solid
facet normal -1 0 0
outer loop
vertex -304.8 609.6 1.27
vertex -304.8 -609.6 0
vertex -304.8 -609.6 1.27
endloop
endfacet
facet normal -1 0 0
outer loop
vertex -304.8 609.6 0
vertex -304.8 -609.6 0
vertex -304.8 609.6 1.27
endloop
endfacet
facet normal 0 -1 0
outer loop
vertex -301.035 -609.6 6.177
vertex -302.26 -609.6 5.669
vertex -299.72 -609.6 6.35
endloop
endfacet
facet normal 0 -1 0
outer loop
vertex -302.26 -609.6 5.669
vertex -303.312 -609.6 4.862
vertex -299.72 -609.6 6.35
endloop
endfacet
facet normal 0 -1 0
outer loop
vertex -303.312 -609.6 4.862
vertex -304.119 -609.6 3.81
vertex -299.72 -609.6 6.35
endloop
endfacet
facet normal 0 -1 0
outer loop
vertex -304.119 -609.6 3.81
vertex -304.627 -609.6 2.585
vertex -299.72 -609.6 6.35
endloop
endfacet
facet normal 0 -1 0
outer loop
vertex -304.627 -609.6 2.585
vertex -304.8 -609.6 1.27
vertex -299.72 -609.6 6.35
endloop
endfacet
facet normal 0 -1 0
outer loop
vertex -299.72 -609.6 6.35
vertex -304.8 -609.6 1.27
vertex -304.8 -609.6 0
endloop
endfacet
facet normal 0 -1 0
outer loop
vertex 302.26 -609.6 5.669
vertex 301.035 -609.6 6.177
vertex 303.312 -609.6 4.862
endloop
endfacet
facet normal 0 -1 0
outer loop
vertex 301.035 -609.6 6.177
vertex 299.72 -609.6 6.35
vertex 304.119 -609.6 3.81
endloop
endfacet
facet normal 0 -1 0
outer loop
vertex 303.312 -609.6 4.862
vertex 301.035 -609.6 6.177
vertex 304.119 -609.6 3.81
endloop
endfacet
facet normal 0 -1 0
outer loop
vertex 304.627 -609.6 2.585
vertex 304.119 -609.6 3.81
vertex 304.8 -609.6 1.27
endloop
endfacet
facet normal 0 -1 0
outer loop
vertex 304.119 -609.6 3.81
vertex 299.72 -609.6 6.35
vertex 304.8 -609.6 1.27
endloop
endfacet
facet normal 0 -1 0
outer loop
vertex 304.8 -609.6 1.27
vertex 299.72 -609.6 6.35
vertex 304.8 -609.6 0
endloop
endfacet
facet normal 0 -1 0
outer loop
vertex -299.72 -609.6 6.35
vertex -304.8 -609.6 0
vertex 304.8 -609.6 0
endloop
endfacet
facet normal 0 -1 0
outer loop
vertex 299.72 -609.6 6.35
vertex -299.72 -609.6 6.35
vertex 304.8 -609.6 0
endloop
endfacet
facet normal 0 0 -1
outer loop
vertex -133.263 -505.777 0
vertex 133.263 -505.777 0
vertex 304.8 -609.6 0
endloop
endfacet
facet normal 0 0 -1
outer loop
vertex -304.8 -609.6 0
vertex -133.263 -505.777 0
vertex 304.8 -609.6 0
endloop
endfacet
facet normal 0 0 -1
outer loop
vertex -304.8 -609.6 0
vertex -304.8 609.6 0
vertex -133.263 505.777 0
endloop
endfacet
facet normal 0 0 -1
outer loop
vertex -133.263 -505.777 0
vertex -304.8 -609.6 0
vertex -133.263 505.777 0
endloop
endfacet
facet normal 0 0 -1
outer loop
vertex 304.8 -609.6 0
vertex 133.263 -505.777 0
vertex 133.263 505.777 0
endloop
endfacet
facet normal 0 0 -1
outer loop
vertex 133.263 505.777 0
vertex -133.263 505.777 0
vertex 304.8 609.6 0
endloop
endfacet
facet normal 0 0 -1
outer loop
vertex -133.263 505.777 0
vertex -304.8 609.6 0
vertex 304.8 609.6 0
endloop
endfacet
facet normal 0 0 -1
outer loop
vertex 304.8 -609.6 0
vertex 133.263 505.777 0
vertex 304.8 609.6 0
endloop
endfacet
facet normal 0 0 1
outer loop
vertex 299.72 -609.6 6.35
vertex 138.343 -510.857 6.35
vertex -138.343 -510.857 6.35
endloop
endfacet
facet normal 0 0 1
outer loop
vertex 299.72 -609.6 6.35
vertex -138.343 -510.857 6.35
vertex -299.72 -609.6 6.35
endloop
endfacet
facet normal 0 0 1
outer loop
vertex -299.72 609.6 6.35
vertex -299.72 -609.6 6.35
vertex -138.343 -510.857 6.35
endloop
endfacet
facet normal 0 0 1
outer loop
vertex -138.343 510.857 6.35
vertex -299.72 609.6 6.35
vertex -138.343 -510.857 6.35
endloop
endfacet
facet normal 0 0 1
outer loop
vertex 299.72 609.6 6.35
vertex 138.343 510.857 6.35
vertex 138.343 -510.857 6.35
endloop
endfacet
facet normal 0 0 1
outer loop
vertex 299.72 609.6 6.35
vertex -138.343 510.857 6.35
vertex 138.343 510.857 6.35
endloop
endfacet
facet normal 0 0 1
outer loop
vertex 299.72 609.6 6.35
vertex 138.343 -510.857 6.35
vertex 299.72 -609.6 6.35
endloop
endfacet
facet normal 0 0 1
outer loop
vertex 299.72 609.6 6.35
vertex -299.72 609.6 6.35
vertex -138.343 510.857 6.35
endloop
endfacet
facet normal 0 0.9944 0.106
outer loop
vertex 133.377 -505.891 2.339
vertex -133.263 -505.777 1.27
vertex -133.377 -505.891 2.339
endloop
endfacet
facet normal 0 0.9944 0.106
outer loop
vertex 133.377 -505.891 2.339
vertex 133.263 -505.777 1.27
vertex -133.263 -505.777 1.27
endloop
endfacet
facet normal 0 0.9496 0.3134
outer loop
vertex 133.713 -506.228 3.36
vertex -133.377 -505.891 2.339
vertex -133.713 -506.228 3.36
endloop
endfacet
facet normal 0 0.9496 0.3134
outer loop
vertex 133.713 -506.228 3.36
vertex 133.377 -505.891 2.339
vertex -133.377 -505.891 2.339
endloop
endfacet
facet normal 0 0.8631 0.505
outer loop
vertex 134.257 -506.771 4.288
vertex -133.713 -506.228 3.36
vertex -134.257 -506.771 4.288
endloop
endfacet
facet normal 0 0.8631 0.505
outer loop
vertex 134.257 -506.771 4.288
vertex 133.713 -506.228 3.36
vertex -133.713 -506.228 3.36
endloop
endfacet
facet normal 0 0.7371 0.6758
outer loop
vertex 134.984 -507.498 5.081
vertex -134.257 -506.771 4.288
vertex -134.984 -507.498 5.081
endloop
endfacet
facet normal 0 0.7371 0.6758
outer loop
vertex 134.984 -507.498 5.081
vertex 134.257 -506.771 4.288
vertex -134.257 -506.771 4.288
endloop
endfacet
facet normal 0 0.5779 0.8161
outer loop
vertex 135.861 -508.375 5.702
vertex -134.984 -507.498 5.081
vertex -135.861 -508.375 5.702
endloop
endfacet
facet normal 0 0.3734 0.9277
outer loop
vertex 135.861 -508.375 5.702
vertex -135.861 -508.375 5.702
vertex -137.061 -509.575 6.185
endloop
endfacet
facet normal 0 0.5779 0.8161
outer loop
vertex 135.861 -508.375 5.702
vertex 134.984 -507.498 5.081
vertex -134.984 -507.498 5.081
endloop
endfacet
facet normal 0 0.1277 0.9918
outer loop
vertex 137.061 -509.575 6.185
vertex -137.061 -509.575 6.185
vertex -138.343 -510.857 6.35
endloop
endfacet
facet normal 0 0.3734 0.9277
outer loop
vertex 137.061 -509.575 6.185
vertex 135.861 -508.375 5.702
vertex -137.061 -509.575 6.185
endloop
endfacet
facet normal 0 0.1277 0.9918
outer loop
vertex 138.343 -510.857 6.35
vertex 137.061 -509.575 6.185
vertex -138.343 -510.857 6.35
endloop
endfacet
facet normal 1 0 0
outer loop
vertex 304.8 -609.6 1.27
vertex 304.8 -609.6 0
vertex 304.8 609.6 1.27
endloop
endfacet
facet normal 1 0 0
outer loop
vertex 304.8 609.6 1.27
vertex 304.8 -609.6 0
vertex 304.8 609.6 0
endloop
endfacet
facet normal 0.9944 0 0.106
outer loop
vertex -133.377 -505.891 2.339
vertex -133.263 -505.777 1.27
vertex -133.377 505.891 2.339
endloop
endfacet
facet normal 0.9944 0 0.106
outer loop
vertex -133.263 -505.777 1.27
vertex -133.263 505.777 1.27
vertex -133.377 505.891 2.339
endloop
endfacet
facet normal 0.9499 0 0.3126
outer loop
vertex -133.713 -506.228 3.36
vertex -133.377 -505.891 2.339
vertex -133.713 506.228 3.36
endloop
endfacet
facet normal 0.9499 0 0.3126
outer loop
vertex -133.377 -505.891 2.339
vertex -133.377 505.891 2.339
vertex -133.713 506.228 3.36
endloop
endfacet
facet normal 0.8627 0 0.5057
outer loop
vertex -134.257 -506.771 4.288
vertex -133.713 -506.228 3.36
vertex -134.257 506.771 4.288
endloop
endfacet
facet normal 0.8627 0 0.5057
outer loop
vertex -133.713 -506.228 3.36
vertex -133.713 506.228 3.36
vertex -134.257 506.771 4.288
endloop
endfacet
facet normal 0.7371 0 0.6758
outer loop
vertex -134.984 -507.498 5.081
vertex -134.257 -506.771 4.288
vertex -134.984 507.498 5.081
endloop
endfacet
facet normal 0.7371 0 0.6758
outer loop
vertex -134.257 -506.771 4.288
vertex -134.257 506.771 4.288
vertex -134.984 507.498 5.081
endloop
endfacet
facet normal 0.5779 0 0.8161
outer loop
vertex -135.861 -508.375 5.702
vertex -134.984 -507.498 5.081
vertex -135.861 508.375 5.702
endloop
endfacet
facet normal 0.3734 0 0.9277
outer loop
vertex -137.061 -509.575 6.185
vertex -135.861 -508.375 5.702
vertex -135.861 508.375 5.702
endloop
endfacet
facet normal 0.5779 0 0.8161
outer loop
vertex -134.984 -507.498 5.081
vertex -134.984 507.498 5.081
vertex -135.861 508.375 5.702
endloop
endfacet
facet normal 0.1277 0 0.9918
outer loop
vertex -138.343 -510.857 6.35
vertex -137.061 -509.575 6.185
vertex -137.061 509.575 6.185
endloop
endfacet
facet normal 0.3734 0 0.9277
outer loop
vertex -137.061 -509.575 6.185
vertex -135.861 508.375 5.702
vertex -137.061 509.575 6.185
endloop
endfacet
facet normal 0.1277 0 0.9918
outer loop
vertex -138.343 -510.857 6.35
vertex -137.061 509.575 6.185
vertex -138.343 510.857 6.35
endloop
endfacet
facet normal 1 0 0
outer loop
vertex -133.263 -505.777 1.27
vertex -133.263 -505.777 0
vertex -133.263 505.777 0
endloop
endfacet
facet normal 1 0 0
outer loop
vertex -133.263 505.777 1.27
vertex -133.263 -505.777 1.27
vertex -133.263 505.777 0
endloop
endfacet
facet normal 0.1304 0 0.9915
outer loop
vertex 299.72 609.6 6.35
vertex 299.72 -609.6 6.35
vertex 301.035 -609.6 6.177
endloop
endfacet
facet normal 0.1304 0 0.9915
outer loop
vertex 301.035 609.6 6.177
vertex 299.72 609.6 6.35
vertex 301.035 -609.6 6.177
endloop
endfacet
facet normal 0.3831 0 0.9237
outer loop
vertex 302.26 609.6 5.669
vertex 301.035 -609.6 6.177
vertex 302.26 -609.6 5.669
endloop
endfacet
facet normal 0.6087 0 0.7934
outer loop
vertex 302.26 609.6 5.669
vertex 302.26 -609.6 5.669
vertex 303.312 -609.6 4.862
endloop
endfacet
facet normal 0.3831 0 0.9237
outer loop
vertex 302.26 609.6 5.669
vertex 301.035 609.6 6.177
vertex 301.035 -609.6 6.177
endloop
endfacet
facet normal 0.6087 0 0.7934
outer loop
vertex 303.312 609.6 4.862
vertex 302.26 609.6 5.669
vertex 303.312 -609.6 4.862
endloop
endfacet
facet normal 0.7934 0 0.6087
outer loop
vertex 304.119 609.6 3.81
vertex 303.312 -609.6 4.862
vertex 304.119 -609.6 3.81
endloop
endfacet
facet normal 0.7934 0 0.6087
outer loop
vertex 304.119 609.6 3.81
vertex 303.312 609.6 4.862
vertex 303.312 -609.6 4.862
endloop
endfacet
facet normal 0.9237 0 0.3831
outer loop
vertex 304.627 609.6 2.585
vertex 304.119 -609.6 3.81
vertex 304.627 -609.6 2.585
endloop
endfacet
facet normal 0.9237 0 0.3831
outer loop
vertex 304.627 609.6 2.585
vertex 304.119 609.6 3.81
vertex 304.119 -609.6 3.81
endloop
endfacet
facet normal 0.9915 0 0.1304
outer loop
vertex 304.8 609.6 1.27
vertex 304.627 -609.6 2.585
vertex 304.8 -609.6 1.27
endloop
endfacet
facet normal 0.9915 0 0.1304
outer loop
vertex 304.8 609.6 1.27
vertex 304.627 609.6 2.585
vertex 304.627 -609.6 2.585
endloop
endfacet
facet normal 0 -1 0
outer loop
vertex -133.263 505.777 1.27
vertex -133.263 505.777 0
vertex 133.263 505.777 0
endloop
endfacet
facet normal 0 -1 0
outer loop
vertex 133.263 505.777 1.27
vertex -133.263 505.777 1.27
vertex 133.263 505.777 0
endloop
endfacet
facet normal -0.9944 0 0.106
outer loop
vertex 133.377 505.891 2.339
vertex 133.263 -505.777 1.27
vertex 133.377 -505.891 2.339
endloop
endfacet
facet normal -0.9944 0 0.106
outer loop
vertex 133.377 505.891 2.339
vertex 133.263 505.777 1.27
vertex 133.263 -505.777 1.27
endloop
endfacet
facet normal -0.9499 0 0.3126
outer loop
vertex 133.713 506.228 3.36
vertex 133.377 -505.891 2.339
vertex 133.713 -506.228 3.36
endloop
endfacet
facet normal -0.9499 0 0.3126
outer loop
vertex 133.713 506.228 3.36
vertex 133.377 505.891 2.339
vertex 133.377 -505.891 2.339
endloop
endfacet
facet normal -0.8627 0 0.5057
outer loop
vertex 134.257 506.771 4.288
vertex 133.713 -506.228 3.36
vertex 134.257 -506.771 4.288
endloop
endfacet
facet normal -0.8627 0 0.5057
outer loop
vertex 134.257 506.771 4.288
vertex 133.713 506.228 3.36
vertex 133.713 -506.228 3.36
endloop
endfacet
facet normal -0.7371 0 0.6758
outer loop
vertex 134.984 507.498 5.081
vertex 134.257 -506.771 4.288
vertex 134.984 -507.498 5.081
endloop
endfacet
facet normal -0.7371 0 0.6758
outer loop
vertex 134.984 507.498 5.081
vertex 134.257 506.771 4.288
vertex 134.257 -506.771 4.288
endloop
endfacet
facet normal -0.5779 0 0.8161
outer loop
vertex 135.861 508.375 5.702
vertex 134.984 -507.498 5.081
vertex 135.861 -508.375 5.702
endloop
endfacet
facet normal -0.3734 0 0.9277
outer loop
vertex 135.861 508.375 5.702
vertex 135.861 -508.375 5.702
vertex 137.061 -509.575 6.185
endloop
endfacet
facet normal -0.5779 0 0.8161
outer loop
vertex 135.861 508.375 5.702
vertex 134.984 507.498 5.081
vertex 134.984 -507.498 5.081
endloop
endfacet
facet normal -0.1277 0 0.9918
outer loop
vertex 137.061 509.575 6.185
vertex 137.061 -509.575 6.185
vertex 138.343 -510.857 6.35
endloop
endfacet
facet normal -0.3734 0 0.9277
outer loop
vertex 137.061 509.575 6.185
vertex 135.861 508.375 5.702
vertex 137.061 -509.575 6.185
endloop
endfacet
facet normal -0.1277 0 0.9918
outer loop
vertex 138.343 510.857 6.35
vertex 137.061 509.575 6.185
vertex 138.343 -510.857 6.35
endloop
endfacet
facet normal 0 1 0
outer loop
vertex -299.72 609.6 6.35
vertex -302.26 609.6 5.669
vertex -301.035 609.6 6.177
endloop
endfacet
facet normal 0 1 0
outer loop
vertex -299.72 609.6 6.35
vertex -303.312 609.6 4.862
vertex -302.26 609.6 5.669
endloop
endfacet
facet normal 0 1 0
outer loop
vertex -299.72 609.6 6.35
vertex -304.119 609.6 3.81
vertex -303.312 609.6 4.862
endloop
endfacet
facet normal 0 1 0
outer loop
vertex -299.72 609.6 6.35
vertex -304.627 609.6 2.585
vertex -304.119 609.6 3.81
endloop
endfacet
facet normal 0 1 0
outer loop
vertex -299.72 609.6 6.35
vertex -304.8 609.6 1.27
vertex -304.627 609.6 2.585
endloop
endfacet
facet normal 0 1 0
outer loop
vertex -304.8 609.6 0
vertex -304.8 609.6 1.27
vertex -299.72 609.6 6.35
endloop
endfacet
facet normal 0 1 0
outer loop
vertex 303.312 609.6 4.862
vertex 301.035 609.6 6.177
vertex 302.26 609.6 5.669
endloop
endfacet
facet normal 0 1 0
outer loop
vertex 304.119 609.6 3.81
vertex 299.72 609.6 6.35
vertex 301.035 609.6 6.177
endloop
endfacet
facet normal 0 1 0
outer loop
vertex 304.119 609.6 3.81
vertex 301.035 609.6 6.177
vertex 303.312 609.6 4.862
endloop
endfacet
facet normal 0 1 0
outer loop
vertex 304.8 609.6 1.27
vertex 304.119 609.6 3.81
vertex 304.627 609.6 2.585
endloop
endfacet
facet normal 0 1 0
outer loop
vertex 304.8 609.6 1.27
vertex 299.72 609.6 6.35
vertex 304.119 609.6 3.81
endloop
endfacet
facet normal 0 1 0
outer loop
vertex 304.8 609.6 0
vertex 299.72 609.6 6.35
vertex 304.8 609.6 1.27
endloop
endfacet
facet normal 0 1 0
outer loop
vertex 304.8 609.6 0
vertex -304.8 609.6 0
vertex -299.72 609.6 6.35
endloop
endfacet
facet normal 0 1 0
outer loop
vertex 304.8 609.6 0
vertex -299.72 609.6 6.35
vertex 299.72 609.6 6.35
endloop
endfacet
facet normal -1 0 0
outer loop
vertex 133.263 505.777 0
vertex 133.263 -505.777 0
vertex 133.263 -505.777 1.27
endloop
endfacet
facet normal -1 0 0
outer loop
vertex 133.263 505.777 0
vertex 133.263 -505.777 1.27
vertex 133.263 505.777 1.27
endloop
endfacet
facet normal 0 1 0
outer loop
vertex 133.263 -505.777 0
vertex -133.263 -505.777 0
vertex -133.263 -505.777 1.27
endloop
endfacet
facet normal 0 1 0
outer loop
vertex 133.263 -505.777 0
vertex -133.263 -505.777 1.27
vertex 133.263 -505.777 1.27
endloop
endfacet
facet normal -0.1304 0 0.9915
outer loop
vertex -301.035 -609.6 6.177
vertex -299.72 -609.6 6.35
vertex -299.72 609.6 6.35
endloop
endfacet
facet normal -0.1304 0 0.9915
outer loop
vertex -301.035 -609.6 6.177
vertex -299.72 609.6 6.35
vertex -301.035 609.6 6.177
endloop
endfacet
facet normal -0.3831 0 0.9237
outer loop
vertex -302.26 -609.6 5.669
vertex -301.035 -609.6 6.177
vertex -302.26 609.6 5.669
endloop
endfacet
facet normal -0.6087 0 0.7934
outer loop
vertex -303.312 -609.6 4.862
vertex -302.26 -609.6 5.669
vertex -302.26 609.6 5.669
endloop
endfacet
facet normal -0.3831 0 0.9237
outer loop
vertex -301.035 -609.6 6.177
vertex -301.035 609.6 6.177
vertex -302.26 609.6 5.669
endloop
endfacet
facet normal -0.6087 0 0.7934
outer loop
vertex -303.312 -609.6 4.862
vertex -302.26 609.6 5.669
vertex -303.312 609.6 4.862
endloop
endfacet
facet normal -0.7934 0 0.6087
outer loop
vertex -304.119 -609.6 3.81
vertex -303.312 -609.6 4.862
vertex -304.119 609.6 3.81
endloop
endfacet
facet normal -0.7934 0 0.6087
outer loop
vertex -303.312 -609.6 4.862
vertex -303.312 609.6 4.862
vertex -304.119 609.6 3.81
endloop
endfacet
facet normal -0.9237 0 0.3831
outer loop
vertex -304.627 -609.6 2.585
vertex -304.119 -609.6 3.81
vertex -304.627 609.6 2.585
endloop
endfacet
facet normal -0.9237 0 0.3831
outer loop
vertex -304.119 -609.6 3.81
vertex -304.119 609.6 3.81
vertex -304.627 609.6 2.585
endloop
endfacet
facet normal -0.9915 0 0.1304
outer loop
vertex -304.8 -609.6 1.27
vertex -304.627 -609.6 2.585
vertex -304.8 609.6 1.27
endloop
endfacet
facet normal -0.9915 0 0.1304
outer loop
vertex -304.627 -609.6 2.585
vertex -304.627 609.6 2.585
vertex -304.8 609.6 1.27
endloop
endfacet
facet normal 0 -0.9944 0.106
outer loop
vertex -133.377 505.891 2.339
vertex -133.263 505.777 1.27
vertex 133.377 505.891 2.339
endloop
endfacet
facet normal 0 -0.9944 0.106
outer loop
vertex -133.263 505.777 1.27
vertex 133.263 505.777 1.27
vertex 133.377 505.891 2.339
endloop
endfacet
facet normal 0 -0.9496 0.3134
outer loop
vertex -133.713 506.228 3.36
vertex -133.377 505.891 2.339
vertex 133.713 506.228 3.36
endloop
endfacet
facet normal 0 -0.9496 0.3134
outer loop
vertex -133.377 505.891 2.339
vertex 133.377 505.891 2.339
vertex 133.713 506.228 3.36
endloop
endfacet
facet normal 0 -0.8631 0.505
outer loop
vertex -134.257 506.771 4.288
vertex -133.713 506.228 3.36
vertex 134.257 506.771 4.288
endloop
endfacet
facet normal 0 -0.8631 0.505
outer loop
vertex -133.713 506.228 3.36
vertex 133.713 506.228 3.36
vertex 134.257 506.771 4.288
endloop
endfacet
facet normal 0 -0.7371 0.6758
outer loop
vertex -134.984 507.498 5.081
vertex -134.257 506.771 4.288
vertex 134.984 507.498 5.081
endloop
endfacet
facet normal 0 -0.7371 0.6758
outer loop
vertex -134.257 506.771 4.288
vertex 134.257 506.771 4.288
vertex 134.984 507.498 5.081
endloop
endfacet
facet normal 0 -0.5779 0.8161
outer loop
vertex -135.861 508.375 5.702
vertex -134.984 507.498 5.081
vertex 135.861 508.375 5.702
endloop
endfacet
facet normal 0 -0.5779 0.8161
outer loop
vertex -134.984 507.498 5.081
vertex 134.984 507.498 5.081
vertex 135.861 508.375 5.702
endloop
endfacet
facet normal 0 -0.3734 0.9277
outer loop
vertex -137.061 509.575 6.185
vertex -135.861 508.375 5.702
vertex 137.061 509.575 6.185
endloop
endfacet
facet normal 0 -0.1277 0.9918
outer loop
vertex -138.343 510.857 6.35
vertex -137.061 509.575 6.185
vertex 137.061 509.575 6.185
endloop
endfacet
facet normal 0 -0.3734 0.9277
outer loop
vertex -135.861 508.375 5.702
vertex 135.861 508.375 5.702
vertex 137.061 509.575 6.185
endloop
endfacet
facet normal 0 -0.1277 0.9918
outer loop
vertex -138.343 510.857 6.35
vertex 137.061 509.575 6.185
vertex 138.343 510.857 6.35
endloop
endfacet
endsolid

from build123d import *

# Parameters (mm, degrees)
F0_W     = 609.6
F0_H     = 1219.2
F0_W_2   = 266.52658
F0_H_2   = 1011.554956
F1_DEPTH = 6.35
F2_R     = 5.08
F3_R     = 5.08


with BuildPart() as f1:
    # F0 (on Top) → F1 (new body)
    with BuildSketch(Plane.XY):
        Rectangle(F0_W, F0_H)
        Rectangle(F0_W_2, F0_H_2, mode=Mode.SUBTRACT)
    extrude(amount=F1_DEPTH)

    # F2
    f2_edges = [f1.edges().sort_by_distance(p)[0] for p in [
        (133.26329, 0, 6.35),
        (0, -505.777478, 6.35),
        (-133.26329, 0, 6.35),
        (0, 505.777478, 6.35),
    ]]
    fillet(f2_edges, radius=F2_R)

    # F3
    f3_edges = [f1.edges().sort_by_distance(p)[0] for p in [
        (-304.8, 0, 6.35),
        (304.8, 0, 6.35),
    ]]
    fillet(f3_edges, radius=F3_R)


solid = f1.part
